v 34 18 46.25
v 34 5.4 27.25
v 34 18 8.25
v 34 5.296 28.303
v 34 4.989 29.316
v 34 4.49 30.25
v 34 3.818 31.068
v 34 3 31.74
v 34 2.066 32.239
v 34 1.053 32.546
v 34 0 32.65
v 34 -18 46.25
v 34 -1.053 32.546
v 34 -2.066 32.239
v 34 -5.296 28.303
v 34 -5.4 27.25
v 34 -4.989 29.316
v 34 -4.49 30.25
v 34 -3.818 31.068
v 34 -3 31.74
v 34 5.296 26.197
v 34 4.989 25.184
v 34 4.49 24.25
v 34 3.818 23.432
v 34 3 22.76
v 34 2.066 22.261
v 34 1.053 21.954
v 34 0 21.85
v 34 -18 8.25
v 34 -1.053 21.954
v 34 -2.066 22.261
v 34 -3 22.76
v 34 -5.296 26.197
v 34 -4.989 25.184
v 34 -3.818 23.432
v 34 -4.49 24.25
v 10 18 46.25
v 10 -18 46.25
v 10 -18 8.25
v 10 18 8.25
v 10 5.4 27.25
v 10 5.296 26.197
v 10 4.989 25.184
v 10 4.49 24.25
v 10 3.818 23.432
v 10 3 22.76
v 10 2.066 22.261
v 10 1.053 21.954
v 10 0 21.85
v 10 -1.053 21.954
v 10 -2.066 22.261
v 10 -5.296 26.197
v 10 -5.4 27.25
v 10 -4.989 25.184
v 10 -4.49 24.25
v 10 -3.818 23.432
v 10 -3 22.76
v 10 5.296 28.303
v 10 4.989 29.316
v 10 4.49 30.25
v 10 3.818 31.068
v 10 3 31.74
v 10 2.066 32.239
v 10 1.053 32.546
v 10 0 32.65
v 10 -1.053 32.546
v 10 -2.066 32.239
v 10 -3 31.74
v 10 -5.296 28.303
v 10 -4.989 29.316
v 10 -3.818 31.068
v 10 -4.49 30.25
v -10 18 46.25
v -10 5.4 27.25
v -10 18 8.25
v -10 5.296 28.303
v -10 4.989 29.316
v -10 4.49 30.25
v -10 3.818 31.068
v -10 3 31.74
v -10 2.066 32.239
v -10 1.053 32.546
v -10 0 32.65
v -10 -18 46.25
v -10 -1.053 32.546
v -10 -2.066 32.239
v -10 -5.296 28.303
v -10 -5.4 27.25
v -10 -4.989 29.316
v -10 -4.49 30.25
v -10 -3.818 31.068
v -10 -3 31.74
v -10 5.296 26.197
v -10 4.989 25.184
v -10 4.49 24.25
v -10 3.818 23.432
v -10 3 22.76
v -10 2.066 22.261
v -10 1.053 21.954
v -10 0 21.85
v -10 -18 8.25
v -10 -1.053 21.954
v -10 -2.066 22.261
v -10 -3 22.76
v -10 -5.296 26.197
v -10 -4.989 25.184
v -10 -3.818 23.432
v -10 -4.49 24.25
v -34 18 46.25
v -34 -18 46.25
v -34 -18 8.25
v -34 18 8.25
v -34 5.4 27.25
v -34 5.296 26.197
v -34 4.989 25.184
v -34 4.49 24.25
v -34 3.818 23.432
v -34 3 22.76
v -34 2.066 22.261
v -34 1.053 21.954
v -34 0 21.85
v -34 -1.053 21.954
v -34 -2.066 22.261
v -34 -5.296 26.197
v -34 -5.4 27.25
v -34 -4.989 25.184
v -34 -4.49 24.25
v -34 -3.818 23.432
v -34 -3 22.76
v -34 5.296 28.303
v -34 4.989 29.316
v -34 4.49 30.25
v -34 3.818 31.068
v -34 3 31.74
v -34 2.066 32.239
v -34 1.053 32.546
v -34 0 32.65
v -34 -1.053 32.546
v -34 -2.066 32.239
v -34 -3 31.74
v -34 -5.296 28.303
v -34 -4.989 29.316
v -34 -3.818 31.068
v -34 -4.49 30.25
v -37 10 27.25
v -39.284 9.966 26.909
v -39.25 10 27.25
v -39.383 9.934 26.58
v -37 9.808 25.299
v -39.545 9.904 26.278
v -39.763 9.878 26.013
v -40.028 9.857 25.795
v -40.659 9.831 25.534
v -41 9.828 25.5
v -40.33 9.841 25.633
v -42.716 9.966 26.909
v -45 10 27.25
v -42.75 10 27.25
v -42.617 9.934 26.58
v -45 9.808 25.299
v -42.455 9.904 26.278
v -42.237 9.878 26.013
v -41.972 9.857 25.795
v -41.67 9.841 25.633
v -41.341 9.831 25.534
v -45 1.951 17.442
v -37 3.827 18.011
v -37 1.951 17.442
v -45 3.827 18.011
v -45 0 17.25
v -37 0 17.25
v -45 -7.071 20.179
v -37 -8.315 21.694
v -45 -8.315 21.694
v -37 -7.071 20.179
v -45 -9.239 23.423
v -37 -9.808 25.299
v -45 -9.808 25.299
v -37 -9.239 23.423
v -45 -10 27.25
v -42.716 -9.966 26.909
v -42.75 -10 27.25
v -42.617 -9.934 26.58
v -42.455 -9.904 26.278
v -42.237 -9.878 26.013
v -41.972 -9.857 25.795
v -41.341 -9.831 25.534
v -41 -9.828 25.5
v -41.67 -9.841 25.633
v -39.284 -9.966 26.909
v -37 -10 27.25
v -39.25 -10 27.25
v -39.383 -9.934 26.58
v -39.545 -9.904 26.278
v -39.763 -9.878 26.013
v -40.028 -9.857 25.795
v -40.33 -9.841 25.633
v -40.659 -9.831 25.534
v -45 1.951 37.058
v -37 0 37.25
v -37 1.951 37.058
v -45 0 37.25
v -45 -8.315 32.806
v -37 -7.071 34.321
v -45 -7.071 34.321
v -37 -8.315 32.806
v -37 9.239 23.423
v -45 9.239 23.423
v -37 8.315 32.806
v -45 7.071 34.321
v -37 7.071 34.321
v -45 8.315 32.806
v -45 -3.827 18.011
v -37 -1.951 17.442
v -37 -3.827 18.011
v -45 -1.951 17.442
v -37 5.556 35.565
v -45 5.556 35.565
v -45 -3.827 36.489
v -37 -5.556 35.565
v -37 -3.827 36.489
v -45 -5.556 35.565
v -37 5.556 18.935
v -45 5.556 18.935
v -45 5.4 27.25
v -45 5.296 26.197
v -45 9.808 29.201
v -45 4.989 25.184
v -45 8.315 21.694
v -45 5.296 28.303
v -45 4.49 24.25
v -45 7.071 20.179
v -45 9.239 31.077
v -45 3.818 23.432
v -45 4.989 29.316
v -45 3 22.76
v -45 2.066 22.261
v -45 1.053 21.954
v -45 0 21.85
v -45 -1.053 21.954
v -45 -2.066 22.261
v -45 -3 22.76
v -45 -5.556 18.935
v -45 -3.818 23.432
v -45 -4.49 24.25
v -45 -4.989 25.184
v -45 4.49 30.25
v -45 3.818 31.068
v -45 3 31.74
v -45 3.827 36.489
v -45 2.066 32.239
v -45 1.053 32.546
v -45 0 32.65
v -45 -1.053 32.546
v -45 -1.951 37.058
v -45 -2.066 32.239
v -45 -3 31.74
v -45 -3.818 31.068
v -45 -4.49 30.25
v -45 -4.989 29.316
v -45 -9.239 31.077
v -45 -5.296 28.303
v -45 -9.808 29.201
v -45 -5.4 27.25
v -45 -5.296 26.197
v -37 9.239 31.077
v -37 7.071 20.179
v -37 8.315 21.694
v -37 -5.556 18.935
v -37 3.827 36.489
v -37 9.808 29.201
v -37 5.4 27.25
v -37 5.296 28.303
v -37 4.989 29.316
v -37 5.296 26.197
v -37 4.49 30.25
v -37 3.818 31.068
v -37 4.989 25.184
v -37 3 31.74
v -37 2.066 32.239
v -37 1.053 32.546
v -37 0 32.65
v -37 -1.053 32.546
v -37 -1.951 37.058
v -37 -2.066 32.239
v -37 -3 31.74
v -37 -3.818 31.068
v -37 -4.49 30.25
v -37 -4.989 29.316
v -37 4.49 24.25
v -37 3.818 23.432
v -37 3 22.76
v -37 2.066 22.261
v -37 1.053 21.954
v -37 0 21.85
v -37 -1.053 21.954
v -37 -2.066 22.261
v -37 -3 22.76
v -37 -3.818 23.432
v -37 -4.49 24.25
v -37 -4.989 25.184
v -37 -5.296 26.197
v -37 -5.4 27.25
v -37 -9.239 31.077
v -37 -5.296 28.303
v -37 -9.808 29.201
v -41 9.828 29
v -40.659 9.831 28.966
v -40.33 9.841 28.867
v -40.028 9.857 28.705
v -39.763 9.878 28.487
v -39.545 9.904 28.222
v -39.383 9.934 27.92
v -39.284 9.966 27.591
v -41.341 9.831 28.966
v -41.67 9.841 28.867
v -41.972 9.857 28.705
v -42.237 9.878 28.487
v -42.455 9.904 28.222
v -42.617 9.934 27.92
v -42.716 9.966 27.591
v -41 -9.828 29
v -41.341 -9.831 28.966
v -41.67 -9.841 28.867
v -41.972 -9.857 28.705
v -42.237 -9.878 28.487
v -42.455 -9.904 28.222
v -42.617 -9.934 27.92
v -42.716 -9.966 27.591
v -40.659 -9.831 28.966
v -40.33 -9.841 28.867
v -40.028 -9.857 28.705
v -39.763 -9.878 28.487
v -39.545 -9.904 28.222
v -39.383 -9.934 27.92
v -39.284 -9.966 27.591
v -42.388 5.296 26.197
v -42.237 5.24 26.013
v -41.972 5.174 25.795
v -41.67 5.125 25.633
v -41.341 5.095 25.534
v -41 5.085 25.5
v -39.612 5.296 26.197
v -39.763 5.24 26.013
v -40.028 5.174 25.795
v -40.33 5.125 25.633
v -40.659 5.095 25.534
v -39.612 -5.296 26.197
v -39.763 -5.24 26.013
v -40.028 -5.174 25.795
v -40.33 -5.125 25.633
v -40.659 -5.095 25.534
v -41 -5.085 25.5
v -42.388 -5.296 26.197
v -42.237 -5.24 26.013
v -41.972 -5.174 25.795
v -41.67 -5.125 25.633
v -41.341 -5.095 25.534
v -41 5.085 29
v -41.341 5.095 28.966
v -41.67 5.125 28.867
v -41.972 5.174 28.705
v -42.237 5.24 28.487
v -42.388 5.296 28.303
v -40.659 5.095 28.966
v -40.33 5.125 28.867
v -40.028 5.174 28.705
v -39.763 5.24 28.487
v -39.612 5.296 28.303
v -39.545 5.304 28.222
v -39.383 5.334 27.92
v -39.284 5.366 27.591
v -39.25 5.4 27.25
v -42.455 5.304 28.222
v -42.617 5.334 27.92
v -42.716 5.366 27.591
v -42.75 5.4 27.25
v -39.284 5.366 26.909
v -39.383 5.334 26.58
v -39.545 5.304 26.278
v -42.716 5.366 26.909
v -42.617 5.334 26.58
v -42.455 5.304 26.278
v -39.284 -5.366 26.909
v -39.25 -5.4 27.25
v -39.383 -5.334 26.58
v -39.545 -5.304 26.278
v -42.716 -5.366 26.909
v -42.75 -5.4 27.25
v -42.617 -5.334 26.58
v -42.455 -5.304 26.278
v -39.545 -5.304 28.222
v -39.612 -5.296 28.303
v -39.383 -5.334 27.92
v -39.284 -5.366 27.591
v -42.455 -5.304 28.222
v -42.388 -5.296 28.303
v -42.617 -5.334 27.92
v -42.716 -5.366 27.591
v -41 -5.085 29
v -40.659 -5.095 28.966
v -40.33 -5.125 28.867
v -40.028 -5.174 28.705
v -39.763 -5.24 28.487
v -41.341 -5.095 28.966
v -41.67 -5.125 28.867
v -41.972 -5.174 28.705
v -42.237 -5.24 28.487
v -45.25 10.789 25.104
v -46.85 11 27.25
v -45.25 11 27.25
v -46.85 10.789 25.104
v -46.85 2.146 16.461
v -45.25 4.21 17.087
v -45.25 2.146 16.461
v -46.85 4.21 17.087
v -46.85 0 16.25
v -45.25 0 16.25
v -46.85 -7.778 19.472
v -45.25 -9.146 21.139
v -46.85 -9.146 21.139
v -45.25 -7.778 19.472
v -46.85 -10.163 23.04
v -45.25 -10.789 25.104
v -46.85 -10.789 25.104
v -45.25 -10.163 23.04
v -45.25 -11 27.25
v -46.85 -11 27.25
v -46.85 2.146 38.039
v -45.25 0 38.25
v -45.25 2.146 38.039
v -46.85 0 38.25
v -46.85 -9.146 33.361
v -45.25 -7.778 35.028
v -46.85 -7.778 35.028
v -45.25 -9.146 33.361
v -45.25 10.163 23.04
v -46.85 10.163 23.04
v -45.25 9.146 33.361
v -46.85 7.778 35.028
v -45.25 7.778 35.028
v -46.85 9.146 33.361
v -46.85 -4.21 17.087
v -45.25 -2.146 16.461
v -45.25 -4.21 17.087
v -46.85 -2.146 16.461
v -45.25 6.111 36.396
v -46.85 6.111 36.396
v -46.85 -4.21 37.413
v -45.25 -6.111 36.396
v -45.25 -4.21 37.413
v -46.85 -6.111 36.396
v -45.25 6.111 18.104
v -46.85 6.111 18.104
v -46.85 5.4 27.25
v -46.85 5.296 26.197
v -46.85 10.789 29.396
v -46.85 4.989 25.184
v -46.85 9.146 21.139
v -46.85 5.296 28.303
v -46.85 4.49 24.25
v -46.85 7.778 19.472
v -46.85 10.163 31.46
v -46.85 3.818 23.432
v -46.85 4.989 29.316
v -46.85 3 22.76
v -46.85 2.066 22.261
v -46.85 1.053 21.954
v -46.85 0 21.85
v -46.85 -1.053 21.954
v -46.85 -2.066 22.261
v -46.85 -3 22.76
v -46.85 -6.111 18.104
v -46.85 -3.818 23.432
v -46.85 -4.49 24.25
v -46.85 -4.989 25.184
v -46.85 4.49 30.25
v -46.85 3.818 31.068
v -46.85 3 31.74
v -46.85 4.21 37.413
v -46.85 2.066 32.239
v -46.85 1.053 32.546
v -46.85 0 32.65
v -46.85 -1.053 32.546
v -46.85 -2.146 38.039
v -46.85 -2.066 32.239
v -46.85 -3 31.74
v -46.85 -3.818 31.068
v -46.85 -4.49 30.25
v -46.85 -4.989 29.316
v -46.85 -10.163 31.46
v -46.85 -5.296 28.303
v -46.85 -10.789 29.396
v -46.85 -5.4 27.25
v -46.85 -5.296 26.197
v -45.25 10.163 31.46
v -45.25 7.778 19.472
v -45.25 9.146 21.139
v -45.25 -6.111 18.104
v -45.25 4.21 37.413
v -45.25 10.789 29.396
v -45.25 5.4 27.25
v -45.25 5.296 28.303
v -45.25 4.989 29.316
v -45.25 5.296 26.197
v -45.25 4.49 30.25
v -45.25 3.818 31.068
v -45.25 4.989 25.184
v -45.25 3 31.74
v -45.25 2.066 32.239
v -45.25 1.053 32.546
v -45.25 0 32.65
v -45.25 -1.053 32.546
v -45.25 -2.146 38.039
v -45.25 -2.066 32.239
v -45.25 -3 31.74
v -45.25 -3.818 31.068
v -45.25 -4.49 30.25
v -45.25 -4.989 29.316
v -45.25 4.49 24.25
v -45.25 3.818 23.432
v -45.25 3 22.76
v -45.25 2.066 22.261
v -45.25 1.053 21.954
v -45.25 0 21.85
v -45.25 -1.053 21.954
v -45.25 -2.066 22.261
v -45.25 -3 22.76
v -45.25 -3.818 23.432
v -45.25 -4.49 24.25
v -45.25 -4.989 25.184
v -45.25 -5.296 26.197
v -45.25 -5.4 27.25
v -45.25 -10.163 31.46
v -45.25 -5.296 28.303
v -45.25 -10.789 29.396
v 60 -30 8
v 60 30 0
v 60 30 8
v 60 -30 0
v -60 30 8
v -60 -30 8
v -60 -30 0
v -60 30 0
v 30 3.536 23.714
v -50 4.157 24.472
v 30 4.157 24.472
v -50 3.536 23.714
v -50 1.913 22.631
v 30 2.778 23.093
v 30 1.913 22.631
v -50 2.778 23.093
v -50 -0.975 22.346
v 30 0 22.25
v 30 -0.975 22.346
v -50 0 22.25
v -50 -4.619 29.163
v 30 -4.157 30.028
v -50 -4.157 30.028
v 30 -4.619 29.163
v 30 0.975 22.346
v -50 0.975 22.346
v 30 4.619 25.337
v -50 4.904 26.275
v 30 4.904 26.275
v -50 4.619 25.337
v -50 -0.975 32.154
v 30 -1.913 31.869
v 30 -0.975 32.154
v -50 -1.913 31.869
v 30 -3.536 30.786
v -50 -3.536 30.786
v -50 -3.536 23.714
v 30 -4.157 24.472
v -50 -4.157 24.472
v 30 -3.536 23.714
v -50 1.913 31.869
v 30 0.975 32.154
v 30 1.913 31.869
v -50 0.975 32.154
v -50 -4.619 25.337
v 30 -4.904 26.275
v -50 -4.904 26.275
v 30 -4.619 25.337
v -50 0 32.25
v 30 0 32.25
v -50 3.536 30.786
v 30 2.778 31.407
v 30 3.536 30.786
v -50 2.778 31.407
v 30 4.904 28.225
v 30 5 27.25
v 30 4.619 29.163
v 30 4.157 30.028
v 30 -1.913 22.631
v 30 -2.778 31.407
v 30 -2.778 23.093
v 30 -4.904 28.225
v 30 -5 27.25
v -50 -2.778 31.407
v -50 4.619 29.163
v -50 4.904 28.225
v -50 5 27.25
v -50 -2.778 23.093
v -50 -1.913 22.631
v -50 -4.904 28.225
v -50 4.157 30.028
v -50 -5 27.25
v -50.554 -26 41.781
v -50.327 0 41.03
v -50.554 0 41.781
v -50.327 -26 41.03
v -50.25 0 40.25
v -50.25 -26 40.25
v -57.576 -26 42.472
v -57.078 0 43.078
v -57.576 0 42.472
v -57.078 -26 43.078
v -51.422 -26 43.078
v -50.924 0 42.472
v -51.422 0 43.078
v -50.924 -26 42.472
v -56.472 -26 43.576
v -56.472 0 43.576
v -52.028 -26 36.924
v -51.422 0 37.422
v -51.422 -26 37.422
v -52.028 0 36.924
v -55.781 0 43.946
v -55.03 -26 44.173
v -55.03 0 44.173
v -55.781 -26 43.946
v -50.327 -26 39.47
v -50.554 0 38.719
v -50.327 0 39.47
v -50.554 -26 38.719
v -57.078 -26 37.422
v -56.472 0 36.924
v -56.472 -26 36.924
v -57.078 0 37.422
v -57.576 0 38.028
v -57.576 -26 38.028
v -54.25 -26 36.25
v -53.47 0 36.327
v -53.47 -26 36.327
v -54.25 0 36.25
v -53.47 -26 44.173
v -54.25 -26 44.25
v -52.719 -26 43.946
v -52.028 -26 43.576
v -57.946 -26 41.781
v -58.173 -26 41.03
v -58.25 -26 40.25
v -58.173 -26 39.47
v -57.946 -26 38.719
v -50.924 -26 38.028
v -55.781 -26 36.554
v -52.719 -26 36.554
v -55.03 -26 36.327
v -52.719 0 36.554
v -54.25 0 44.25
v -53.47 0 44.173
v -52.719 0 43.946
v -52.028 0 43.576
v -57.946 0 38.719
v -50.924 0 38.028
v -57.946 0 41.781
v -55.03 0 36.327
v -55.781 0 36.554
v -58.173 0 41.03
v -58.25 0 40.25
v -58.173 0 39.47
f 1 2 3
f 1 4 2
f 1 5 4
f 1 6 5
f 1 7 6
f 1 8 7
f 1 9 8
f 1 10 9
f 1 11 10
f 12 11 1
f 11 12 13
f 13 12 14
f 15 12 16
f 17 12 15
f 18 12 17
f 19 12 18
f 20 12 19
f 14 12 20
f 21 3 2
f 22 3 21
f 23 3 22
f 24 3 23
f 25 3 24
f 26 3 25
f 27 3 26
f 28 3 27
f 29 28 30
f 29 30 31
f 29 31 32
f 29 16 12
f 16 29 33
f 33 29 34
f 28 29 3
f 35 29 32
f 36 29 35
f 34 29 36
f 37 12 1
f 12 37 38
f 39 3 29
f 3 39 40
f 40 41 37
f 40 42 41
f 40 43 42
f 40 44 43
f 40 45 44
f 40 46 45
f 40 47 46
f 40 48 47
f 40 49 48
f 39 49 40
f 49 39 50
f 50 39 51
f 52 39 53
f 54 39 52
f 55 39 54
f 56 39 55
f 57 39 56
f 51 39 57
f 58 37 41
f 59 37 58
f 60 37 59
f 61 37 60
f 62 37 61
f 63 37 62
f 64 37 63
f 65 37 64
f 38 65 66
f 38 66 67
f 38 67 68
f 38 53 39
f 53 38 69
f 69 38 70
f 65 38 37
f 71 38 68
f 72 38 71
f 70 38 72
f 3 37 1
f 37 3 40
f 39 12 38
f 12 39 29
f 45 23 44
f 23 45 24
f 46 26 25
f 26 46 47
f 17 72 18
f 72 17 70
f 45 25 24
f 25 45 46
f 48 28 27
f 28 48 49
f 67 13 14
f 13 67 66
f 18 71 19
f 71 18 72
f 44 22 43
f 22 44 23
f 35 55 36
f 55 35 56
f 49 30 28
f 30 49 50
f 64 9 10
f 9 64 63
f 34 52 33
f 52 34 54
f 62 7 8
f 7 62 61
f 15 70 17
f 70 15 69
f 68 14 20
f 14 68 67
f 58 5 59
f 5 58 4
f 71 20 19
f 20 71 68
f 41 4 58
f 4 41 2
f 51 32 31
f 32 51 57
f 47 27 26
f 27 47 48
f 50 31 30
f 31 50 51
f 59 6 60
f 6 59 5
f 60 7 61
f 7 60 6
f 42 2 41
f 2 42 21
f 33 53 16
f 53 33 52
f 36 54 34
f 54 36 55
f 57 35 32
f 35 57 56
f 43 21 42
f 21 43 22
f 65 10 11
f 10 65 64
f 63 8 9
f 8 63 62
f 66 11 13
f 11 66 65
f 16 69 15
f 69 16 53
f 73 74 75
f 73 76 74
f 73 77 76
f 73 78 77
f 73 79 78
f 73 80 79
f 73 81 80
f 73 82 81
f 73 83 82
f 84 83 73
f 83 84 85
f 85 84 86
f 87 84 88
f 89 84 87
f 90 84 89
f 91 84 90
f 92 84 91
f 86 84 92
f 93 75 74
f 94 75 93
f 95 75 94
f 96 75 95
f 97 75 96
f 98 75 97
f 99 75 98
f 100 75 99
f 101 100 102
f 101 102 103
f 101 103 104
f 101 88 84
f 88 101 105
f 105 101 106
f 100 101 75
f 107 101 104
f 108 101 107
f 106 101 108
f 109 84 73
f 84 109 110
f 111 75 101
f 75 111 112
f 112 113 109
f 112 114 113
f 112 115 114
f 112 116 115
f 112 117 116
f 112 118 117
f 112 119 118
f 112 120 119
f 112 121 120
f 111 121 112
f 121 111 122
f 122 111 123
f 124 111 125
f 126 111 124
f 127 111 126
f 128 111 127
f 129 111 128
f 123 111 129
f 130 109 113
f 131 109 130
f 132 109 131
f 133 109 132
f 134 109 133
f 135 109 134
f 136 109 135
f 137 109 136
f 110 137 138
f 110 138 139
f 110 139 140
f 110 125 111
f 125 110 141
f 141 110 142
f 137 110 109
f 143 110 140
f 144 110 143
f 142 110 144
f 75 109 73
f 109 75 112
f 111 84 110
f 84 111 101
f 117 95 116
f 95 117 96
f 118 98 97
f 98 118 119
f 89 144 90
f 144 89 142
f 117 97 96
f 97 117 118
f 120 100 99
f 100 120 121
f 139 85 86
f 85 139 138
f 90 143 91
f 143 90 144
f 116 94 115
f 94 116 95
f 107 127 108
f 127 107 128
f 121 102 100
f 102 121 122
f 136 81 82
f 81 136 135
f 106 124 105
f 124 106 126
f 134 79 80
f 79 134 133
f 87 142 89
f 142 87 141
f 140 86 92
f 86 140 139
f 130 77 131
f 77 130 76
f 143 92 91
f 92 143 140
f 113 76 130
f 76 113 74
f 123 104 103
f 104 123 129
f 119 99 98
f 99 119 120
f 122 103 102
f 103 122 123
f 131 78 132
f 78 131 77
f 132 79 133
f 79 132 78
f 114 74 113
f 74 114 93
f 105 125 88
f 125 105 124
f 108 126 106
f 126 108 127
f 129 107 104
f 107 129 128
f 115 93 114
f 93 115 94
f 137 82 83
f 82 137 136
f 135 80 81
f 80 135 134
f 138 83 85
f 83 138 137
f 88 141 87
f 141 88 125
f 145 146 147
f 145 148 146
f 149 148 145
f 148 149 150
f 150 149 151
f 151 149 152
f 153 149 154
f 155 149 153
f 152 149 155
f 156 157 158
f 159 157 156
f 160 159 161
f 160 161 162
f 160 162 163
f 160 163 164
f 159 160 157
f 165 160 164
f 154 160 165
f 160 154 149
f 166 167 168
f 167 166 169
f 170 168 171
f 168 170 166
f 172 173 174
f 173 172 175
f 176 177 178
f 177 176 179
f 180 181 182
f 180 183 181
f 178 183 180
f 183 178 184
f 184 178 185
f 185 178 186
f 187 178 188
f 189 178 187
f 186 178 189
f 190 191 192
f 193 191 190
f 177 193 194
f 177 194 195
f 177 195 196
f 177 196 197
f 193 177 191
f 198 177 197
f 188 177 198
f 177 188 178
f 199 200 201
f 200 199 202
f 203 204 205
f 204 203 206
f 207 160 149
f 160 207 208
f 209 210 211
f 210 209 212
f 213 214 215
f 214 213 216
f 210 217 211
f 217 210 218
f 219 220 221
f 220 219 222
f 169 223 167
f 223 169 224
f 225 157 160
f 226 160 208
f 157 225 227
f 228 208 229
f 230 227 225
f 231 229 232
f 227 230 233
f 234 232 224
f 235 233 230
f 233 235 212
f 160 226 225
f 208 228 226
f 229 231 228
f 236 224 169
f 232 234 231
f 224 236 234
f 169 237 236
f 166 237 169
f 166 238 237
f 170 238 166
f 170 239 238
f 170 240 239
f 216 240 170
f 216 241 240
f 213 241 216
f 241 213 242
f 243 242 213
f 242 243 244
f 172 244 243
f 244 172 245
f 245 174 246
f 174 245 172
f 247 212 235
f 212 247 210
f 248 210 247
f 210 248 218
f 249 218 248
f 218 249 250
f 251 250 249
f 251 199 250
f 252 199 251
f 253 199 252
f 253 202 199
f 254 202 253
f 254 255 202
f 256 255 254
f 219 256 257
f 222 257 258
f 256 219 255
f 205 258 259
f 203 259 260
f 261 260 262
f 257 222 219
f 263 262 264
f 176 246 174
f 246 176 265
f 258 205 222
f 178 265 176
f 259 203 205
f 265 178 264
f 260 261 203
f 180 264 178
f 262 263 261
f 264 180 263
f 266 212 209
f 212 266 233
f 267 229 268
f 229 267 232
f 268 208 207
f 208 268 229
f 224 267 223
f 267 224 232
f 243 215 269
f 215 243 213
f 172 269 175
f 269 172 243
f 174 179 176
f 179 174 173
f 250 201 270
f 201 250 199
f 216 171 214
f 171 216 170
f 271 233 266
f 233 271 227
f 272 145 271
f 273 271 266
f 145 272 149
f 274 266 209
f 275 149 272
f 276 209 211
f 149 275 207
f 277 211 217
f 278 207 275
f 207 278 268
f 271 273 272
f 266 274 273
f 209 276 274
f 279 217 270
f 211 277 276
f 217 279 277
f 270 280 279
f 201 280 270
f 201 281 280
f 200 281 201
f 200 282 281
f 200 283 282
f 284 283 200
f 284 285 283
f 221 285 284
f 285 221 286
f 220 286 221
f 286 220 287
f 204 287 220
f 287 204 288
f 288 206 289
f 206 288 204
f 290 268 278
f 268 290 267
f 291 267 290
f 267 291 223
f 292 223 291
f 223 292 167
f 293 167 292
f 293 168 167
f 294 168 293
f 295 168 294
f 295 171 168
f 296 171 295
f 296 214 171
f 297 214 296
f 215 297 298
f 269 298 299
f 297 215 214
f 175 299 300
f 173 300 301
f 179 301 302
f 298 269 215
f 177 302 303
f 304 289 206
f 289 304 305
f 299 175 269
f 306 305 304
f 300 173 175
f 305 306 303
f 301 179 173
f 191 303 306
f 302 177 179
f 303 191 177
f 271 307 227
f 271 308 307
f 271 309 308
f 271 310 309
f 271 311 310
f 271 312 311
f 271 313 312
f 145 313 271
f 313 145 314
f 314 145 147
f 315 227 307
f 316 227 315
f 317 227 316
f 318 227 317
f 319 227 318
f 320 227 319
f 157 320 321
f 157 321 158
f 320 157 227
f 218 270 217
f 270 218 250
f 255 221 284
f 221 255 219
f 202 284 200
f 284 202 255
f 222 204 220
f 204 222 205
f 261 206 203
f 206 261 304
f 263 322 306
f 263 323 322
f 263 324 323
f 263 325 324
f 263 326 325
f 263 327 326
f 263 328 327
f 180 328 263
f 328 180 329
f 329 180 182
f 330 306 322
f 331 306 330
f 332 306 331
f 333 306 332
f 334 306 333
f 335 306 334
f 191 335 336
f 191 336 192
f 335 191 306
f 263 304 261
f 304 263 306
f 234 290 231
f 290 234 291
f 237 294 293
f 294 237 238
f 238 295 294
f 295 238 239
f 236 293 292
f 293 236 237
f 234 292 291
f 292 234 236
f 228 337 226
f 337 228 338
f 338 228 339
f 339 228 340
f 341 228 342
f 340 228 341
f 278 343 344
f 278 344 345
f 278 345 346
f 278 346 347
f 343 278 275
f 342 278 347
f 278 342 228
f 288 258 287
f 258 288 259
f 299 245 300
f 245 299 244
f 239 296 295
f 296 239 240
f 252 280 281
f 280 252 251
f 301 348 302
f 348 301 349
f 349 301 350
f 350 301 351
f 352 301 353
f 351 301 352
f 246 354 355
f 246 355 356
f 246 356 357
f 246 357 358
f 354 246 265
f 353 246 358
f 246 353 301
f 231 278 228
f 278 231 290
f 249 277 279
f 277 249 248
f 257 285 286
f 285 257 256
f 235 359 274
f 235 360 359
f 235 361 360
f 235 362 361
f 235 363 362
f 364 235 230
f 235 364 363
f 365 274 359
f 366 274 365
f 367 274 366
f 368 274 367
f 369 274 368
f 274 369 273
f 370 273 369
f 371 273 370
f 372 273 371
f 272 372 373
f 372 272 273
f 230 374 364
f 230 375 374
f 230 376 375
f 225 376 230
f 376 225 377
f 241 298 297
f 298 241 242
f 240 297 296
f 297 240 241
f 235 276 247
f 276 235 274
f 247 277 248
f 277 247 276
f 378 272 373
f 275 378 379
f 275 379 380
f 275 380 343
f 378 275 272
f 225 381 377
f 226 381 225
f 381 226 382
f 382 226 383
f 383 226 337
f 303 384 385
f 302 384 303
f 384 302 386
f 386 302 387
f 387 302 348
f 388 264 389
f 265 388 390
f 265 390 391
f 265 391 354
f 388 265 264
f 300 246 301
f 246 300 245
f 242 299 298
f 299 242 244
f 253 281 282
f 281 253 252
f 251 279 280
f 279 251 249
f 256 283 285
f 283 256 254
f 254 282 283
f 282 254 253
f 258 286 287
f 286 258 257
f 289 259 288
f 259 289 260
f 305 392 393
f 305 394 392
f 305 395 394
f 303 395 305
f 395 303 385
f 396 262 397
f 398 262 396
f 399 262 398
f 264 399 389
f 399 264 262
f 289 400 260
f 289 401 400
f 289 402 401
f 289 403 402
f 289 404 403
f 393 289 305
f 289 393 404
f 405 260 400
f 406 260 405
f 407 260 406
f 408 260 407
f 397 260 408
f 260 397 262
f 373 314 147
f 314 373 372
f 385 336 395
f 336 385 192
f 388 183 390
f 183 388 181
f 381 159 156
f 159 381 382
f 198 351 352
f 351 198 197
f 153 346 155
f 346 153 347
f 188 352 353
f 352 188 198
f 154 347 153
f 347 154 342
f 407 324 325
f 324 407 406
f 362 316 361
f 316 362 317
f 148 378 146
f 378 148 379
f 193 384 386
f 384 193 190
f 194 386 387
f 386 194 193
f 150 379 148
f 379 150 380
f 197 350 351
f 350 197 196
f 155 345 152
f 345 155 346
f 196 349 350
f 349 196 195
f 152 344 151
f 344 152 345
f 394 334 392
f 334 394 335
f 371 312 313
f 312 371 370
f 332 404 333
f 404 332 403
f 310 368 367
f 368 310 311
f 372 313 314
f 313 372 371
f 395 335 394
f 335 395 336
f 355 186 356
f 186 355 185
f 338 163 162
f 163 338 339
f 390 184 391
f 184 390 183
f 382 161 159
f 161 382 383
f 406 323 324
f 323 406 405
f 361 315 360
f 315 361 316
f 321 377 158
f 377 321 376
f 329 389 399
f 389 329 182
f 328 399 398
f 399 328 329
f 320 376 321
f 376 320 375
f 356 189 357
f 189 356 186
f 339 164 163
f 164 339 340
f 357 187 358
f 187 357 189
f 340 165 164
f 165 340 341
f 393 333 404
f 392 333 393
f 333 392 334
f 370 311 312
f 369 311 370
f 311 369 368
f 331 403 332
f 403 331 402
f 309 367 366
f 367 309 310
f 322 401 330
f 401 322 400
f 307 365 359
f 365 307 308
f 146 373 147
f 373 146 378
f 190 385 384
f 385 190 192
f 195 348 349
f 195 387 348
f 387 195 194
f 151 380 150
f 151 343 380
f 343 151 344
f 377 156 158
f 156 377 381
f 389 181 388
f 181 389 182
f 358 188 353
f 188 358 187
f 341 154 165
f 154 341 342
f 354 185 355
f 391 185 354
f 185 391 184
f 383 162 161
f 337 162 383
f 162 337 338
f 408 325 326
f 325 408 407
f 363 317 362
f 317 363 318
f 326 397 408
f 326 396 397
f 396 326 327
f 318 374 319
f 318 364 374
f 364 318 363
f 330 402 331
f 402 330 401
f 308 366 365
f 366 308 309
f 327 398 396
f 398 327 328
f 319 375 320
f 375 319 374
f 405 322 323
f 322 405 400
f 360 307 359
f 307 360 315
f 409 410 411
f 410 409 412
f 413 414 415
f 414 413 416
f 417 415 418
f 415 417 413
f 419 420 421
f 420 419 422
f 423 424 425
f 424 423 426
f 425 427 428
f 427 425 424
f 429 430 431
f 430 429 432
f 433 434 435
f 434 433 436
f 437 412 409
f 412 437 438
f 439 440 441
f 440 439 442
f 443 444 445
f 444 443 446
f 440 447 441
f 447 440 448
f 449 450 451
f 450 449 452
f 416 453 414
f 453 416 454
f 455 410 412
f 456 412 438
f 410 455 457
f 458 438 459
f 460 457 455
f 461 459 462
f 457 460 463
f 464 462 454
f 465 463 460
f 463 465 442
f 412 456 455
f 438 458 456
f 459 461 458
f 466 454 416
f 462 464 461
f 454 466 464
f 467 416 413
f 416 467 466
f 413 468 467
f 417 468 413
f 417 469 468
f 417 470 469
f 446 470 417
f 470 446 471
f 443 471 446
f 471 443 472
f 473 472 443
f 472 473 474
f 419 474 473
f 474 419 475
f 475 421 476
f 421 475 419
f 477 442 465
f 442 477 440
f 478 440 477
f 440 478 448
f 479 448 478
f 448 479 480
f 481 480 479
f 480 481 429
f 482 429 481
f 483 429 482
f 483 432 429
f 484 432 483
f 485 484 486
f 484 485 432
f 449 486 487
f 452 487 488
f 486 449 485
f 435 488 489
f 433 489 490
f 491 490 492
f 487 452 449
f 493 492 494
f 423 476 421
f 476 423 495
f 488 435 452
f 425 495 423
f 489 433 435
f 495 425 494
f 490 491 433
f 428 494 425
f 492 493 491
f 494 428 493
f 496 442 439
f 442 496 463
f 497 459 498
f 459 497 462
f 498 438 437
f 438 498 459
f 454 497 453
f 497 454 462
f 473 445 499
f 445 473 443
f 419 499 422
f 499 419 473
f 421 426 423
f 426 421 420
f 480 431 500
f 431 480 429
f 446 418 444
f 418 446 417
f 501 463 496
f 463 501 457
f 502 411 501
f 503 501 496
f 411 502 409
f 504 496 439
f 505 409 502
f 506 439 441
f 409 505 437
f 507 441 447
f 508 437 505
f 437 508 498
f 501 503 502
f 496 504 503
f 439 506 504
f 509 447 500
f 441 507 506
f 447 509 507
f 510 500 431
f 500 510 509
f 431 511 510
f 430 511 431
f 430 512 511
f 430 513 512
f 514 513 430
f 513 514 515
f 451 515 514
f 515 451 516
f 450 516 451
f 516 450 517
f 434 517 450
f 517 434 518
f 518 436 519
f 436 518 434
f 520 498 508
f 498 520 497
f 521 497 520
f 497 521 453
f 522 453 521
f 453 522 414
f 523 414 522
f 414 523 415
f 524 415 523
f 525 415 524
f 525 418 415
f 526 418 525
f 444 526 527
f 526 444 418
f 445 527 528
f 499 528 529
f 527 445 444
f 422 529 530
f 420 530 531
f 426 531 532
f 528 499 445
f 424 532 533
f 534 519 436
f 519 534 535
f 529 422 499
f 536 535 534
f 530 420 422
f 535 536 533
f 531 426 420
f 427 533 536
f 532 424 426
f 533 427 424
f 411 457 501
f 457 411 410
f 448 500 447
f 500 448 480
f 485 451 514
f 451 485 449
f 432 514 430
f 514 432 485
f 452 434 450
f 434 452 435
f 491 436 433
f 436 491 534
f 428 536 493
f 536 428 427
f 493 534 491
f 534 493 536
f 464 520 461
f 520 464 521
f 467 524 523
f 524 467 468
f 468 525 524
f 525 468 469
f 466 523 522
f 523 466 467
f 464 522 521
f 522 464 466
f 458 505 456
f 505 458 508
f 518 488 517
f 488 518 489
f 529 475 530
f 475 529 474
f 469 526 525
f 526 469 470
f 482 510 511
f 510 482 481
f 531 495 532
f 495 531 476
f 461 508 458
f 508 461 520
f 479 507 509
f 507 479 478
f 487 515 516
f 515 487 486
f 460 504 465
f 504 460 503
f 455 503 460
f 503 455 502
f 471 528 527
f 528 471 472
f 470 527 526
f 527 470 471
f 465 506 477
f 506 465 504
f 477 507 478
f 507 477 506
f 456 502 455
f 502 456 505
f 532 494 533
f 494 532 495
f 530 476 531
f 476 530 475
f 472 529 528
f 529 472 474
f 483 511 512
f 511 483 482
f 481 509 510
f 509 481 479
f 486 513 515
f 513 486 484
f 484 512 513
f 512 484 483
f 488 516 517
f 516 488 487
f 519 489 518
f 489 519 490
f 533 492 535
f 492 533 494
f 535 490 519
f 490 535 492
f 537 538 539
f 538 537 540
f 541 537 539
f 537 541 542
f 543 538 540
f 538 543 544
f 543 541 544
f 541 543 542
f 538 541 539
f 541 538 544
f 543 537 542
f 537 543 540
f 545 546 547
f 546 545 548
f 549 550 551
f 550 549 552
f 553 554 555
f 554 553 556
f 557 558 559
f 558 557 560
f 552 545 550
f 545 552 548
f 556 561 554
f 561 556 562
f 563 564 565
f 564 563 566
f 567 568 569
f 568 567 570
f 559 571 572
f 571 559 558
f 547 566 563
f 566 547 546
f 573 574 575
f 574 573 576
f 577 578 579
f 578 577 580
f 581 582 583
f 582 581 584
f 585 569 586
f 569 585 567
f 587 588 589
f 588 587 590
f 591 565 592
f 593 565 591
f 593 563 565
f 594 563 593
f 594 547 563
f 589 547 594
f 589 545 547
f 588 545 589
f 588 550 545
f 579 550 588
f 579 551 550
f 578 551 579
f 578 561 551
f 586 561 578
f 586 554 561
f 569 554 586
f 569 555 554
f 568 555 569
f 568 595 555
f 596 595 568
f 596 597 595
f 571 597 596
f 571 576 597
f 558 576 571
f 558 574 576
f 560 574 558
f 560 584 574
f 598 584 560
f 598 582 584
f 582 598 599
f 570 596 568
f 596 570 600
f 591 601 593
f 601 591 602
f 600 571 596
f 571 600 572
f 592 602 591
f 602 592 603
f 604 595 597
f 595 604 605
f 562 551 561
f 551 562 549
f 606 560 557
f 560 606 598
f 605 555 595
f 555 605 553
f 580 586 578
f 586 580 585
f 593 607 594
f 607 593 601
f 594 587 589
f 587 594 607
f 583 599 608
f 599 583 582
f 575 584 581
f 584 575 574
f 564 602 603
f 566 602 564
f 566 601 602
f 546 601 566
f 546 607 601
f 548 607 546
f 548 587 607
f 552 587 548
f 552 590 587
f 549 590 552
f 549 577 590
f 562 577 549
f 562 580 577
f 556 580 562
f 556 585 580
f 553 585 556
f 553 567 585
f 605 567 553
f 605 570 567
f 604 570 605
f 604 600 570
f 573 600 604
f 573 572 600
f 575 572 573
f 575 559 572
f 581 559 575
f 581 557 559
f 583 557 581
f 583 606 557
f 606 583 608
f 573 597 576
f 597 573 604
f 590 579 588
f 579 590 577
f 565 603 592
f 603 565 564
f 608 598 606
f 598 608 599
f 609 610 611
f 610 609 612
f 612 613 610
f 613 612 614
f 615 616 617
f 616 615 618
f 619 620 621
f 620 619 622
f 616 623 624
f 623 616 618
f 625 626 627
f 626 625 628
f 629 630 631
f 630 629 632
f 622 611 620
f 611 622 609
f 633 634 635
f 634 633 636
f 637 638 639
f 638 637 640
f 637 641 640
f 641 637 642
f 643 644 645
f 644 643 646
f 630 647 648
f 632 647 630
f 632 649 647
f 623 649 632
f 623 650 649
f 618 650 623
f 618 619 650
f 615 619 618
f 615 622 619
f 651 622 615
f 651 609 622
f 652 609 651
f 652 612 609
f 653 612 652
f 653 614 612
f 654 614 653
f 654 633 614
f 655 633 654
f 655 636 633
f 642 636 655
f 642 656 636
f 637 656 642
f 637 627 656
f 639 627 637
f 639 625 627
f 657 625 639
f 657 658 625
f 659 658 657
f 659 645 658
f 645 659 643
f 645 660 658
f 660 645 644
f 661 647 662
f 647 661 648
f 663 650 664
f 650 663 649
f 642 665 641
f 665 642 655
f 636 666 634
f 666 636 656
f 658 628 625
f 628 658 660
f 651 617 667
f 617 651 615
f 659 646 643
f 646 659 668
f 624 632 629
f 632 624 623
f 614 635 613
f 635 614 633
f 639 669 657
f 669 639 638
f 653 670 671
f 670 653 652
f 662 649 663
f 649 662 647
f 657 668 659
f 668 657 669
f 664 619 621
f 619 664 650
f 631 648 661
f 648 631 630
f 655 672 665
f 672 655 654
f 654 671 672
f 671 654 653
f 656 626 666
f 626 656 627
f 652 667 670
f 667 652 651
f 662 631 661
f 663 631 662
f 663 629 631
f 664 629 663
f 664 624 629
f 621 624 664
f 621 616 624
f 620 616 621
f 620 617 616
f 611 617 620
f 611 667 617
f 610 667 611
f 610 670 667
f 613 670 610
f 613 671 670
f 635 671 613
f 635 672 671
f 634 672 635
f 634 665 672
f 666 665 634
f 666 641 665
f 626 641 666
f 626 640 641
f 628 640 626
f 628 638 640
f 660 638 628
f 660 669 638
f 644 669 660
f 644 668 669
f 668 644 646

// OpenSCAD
$fn = 32;

// ------------------------------------------------------------------------
// Machine vise: screw d10, jaws 24 x 38 mm
// Every part is its own module, assembly() places every instance.
// ------------------------------------------------------------------------

// --- part 1 ---
module vise_bed() {
  difference() {
    translate([-60, -30, 0]) cube([120, 60, 8]);
  }
}

// --- part 2 ---
module vise_jaw() {
  difference() {
    translate([-12, -18, 0]) cube([24, 36, 38]);
    translate([0, 0, 19]) rotate([0, 90, 0]) cylinder(h = 26, d = 10.8, center = true);
  }
}

// --- part 3 ---
module vise_screw() {
  translate([0, 0, -40]) cylinder(h = 80, d = 10);
}

// --- part 4 ---
module screw_collar() {
  difference() {
    cylinder(h = 8, d = 20);
    translate([0, 0, -1]) cylinder(h = 10, d = 10.8);
    translate([0, 0, 4]) rotate([90, 0, 0]) cylinder(h = 22, d = 3.5, center = true);
  }
}

// --- part 5 ---
module screw_washer() {
  difference() {
      translate([0, 0, 0]) cylinder(h = 1.6, d = 22);
      translate([0, 0, -1]) cylinder(h = 3.6, d = 10.8);
    }
}

// --- part 6 ---
module vise_handle() {
  cylinder(h = 26, d = 8);
}

// --- assembly ---
module assembly() {
  color([0.80, 0.24, 0.20]) translate([0, 0, 0]) rotate([0, 0, 0]) vise_bed();
  color([0.20, 0.45, 0.75]) translate([22, 0, 8.25]) rotate([0, 0, 0]) vise_jaw();
  color([0.25, 0.62, 0.32]) translate([-22, 0, 8.25]) rotate([0, 0, 0]) vise_jaw();
  color([0.92, 0.70, 0.18]) translate([-10, 0, 27.25]) rotate([0, 90, 0]) vise_screw();
  color([0.58, 0.35, 0.70]) translate([-45, 0, 27.25]) rotate([0, 90, 0]) screw_collar();
  color([0.16, 0.66, 0.66]) translate([-46.85, 0, 27.25]) rotate([0, 90, 0]) screw_washer();
  color([0.85, 0.48, 0.18]) translate([-54.25, 0, 40.25]) rotate([90, 0, 0]) vise_handle();
}

assembly();
